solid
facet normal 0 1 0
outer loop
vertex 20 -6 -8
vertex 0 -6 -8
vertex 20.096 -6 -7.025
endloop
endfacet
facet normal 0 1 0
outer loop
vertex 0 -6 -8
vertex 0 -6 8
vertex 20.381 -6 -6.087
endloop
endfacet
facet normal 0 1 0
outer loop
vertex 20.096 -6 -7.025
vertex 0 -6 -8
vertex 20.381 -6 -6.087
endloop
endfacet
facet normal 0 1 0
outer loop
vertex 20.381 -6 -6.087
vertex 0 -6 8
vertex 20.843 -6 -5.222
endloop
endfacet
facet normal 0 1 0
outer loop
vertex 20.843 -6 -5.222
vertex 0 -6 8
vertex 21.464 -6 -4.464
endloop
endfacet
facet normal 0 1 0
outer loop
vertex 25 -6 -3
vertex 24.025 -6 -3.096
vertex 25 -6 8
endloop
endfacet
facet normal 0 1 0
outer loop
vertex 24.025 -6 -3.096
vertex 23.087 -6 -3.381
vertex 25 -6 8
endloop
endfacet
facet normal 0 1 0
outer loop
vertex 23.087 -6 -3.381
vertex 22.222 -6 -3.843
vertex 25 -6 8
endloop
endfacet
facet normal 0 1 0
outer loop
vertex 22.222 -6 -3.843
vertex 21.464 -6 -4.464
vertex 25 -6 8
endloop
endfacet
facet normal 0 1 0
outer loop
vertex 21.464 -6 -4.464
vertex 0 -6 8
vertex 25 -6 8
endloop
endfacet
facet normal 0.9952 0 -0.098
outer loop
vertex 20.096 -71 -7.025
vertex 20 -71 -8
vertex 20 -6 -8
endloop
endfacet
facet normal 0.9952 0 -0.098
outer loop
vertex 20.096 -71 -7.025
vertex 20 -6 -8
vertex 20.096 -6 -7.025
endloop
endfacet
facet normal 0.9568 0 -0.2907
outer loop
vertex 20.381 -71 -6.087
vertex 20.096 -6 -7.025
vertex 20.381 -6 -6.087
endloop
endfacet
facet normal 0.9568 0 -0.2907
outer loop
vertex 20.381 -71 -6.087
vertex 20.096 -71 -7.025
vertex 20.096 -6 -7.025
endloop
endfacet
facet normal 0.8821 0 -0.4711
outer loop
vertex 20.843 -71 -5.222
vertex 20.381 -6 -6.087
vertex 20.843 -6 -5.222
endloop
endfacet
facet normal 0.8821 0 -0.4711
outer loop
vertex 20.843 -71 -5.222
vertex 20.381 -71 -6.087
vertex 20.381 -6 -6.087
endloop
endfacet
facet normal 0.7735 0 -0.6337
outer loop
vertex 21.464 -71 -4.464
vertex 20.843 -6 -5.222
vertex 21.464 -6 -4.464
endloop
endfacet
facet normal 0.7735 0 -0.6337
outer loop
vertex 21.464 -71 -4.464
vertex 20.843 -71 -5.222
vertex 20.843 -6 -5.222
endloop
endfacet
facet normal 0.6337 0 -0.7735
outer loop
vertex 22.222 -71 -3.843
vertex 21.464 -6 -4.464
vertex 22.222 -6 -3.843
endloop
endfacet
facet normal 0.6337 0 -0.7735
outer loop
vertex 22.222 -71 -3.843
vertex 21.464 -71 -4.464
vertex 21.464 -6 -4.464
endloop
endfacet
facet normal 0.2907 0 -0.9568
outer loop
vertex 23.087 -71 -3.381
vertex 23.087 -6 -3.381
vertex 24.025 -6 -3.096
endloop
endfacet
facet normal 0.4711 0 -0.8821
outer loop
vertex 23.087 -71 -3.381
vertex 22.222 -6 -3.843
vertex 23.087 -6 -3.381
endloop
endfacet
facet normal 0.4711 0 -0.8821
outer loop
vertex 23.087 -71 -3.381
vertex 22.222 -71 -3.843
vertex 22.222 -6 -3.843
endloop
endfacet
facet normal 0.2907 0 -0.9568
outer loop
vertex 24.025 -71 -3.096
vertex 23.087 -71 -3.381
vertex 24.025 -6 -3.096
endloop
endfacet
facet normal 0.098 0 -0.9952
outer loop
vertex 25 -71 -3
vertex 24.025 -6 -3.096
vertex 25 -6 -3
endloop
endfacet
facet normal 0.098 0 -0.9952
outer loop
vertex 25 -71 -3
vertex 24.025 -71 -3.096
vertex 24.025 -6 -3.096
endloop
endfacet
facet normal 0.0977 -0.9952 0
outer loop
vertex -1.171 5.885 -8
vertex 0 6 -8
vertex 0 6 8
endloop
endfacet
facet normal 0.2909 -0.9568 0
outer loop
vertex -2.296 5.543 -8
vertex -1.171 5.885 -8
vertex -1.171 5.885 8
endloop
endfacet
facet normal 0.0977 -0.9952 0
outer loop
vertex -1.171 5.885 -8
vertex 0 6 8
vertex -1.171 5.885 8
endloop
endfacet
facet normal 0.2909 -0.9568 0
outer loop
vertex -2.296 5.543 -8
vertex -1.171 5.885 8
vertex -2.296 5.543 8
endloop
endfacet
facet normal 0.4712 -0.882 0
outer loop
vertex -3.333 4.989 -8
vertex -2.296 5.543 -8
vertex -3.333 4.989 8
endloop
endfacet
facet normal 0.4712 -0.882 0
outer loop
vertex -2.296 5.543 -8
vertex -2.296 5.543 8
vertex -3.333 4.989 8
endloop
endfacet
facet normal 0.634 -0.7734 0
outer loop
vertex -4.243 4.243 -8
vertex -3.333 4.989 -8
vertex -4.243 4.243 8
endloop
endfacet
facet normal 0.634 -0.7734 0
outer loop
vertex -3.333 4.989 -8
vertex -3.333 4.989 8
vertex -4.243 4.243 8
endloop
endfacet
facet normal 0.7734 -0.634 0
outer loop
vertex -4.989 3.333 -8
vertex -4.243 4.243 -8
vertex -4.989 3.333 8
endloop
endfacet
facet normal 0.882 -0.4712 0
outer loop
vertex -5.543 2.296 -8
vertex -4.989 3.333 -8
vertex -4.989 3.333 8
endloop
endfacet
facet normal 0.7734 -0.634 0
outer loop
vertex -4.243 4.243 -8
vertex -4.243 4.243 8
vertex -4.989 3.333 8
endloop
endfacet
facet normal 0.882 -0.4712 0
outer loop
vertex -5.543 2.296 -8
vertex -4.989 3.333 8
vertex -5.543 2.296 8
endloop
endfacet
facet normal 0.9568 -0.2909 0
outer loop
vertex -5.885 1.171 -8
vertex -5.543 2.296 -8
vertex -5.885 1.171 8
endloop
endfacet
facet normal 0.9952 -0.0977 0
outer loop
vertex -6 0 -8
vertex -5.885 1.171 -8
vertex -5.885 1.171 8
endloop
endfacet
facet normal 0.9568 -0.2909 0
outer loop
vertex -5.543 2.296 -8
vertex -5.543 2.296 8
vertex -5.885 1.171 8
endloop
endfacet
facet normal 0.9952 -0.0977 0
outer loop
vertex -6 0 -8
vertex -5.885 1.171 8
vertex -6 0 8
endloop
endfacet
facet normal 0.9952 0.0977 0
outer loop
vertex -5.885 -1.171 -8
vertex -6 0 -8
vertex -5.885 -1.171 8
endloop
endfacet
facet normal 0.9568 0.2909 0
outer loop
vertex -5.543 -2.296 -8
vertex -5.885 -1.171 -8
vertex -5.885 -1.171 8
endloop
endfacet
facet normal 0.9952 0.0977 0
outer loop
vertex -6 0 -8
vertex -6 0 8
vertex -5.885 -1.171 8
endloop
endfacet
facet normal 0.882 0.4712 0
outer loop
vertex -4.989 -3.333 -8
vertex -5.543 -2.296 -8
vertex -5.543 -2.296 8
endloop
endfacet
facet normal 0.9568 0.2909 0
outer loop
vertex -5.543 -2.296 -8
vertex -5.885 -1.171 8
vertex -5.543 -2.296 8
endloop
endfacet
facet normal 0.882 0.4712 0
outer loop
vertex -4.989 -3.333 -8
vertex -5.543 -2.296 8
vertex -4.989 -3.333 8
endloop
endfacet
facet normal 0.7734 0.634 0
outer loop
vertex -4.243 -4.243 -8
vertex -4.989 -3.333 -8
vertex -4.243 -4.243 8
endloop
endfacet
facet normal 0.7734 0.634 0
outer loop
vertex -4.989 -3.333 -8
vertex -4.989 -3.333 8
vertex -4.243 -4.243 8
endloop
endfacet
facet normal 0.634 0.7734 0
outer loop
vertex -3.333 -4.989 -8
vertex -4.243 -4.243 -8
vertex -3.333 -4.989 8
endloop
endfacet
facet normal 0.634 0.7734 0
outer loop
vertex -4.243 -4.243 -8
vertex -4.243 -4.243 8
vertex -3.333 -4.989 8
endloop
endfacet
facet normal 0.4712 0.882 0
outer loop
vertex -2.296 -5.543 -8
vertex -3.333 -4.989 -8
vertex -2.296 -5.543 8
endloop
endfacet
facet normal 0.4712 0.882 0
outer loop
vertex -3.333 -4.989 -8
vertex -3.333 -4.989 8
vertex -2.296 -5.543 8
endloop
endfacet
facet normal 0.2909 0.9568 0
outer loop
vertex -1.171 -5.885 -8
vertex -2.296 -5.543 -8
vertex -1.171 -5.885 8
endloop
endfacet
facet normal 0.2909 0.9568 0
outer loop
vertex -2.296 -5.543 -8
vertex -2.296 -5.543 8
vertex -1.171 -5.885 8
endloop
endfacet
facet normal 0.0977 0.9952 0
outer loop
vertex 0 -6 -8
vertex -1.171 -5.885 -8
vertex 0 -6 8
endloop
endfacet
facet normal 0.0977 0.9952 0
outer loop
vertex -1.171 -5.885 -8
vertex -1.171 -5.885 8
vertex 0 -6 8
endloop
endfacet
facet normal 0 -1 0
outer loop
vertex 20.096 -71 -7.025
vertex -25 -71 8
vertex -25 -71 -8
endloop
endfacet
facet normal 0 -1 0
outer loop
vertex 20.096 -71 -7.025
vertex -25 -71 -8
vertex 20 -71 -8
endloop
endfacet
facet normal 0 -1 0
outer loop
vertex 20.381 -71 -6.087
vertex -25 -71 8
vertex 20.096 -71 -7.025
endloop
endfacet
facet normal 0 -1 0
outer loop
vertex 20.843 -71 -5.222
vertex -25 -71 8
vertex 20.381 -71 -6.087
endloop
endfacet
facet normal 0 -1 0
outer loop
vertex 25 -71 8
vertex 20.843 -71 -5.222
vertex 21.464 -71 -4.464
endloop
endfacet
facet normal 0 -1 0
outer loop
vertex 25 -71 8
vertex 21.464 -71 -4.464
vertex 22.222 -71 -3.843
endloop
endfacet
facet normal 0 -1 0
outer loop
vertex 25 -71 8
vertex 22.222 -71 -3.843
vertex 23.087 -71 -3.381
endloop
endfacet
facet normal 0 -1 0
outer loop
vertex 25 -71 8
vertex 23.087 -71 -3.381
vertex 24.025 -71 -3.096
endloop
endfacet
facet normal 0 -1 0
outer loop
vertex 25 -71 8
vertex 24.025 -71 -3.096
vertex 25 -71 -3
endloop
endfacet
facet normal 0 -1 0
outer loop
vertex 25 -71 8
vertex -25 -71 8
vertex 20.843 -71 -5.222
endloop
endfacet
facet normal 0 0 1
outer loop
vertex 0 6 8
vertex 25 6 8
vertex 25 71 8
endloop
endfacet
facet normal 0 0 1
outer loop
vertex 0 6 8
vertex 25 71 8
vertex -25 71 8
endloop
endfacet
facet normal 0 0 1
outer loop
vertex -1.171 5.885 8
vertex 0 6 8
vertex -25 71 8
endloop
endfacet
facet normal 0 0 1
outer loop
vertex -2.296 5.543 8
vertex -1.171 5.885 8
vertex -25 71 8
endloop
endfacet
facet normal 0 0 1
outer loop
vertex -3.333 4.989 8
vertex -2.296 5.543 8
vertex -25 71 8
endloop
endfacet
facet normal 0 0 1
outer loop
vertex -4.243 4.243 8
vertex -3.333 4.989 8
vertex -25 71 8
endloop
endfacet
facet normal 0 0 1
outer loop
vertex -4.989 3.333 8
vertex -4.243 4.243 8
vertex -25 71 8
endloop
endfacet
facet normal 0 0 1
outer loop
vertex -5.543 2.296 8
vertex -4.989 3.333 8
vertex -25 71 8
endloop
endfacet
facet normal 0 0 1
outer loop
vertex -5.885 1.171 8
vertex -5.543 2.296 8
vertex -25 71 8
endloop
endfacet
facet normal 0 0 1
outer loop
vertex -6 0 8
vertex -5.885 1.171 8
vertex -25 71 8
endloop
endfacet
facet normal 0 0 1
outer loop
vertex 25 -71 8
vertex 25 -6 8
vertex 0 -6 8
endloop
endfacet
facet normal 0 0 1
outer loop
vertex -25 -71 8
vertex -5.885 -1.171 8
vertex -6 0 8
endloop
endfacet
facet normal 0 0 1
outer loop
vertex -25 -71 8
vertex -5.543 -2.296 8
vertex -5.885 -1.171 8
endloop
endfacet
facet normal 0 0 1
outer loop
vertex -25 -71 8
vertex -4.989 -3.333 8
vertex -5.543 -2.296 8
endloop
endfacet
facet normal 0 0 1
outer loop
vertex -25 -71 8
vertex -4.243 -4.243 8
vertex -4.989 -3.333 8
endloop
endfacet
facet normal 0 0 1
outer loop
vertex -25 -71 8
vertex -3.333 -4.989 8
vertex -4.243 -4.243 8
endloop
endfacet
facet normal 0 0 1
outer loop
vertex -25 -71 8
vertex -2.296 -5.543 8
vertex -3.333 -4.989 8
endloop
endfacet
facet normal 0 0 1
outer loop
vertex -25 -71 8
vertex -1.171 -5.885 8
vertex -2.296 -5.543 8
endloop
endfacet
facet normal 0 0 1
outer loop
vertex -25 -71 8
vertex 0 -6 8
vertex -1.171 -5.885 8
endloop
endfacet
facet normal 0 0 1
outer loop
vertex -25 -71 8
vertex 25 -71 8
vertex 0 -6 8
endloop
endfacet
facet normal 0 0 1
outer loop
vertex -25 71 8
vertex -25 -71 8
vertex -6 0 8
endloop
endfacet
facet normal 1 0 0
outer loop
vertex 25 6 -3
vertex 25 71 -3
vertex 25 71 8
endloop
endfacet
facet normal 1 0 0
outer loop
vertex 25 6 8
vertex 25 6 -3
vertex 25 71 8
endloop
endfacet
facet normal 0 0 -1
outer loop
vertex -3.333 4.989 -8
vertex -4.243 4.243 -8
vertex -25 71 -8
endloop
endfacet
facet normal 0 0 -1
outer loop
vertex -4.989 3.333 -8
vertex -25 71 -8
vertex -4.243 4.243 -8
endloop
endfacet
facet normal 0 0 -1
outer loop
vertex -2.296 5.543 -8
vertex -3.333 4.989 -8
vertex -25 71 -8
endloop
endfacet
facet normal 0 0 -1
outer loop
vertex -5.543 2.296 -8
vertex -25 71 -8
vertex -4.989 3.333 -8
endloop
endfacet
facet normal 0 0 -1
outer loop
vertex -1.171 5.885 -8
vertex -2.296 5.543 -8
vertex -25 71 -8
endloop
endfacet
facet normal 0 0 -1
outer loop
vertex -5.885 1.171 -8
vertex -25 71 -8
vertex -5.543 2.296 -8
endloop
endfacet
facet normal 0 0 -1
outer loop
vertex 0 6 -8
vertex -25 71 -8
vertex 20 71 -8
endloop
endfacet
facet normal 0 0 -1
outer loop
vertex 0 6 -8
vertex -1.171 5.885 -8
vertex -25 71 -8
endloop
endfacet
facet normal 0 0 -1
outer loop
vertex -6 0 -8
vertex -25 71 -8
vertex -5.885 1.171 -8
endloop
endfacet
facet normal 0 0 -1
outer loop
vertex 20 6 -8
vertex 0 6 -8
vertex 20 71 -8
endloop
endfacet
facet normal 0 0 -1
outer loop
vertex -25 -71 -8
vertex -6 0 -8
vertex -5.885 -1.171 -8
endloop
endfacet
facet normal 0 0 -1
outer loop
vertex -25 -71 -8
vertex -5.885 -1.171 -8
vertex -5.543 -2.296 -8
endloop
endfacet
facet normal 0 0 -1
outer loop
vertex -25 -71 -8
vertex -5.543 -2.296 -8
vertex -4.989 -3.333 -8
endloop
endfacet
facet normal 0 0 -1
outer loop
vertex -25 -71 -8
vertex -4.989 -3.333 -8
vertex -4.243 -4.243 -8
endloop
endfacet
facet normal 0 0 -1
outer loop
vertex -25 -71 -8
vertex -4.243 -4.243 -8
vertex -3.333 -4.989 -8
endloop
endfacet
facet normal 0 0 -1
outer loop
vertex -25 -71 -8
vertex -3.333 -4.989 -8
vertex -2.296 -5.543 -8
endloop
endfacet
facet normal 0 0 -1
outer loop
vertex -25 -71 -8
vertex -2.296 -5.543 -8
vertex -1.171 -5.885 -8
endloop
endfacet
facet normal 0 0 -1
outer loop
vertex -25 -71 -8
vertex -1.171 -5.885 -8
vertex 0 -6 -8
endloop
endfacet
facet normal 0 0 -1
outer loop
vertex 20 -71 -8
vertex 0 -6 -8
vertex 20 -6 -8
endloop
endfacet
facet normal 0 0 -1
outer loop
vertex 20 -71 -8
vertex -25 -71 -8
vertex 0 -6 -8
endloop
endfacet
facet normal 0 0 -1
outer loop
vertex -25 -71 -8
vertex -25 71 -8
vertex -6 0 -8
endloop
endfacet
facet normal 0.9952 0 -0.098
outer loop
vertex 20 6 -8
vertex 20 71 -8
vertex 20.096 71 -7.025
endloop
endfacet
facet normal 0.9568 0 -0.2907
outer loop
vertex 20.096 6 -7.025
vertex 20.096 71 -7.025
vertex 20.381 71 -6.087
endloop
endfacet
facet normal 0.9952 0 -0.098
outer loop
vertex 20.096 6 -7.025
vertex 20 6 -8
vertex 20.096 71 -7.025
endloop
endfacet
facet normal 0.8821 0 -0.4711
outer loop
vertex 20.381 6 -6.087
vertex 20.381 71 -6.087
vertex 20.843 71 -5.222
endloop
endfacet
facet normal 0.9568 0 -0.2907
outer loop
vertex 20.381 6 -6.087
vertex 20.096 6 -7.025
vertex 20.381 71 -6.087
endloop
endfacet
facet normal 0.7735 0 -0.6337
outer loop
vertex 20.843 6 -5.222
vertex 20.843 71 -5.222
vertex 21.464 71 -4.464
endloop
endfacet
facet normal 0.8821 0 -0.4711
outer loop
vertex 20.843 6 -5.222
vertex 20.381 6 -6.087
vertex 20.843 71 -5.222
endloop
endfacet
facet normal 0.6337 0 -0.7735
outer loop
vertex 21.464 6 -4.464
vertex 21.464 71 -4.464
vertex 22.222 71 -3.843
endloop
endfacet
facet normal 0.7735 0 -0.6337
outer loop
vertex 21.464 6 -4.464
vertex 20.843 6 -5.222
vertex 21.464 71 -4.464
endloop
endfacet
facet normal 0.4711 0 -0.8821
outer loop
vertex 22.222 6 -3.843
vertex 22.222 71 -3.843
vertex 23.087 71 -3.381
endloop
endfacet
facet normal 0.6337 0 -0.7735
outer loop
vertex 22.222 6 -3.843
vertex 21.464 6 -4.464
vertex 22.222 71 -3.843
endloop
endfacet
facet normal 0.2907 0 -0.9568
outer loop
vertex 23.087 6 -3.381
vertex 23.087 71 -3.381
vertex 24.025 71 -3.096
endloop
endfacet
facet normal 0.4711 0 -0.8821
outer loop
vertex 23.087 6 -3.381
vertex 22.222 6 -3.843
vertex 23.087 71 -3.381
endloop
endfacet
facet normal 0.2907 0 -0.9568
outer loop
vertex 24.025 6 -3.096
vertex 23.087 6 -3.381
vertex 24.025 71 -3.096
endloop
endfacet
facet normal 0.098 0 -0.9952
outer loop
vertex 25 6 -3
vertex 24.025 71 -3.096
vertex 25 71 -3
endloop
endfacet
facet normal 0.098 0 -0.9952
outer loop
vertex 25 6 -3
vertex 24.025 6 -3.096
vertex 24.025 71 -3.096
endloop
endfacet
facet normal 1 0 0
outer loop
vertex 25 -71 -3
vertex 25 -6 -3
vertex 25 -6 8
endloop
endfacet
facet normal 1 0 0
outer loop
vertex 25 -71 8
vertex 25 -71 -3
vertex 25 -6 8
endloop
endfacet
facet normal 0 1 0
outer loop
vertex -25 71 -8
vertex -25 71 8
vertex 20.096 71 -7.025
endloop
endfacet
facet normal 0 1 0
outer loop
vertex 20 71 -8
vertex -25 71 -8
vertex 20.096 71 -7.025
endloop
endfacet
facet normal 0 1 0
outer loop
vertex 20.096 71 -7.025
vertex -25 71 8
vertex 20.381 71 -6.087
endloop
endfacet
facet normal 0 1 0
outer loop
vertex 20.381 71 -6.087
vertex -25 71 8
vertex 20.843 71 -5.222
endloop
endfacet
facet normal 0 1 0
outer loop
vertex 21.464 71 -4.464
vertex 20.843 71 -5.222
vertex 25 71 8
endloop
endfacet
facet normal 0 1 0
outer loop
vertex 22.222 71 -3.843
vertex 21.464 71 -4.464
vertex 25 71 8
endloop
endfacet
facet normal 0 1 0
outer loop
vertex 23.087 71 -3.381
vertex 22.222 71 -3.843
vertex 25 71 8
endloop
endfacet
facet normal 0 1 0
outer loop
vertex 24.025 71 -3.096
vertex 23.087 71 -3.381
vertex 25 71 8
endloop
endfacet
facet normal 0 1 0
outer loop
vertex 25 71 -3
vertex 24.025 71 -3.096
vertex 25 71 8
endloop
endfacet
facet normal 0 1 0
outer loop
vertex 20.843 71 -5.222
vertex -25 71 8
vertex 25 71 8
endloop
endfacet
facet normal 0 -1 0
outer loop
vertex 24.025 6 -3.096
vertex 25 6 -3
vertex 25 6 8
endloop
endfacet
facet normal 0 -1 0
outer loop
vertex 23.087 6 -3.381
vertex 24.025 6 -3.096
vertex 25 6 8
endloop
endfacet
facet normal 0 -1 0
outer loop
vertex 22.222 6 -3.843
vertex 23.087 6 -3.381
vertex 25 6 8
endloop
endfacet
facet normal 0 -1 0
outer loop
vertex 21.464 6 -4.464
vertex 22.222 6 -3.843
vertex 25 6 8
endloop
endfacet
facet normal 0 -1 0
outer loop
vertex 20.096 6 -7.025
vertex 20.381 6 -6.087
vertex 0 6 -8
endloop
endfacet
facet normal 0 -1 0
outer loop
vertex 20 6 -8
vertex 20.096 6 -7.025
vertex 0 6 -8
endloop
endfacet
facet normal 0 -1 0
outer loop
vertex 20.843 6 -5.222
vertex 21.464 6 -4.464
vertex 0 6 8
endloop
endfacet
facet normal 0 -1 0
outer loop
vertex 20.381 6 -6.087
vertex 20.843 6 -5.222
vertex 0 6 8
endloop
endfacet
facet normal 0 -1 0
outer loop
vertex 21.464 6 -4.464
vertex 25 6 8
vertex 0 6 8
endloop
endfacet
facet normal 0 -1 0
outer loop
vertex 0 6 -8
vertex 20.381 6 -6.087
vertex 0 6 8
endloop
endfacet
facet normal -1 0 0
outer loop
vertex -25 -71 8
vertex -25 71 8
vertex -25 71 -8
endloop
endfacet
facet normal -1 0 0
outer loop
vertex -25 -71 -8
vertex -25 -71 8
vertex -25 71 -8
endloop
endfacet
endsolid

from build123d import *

# Parameters (mm, degrees)
F1_DEPTH = 71
F3_DEPTH = 16
F4_DEPTH = 6
F5_W     = 25.042631
F5_H     = 12
F6_DEPTH = 12.4


with BuildPart() as f1:
    # F0 (on Front) → F1 (new body, symmetric)
    with BuildSketch(Plane.XZ):
        with BuildLine():
            Line((25, -3), (25, 8))
            Line((25, 8), (-25, 8))
            Line((-25, 8), (-25, -8))
            Line((-25, -8), (20, -8))
            ThreePointArc((20, -8), (21.464466, -4.464466), (25, -3))
        make_face()
    extrude(amount=F1_DEPTH, both=True)

    # F2 (on face) → F3 (cut)
    with BuildSketch(Plane.XY.offset(8)):
        with BuildLine():
            ThreePointArc((0, -6), (4.242641, -4.242641), (6, 0))
            ThreePointArc((6, 0), (4.242641, 4.242641), (0, 6))
            ThreePointArc((0, 6), (-6, 0), (0, -6))
        make_face()
    extrude(amount=-F3_DEPTH, mode=Mode.SUBTRACT)

    # F2 (on face) → F4 (cut)
    with BuildSketch(Plane.XY.offset(8)):
        with BuildLine():
            ThreePointArc((0, 6), (4.242641, 4.242641), (6, 0))
            ThreePointArc((6, 0), (4.242641, -4.242641), (0, -6))
            Line((0, -6), (25, -6))
            Line((25, -6), (25, 6))
            Line((25, 6), (0, 6))
        make_face()
    extrude(amount=-F4_DEPTH, mode=Mode.SUBTRACT)

    # F5 (on face) → F6 (cut)
    with BuildSketch(Plane(origin=(0, 0, -8), x_dir=(1, 0, 0), z_dir=(0, 0, -1))):
        with Locations((12.521316, 0)):
            Rectangle(F5_W, F5_H)
    extrude(amount=-F6_DEPTH, mode=Mode.SUBTRACT)


solid = f1.part
